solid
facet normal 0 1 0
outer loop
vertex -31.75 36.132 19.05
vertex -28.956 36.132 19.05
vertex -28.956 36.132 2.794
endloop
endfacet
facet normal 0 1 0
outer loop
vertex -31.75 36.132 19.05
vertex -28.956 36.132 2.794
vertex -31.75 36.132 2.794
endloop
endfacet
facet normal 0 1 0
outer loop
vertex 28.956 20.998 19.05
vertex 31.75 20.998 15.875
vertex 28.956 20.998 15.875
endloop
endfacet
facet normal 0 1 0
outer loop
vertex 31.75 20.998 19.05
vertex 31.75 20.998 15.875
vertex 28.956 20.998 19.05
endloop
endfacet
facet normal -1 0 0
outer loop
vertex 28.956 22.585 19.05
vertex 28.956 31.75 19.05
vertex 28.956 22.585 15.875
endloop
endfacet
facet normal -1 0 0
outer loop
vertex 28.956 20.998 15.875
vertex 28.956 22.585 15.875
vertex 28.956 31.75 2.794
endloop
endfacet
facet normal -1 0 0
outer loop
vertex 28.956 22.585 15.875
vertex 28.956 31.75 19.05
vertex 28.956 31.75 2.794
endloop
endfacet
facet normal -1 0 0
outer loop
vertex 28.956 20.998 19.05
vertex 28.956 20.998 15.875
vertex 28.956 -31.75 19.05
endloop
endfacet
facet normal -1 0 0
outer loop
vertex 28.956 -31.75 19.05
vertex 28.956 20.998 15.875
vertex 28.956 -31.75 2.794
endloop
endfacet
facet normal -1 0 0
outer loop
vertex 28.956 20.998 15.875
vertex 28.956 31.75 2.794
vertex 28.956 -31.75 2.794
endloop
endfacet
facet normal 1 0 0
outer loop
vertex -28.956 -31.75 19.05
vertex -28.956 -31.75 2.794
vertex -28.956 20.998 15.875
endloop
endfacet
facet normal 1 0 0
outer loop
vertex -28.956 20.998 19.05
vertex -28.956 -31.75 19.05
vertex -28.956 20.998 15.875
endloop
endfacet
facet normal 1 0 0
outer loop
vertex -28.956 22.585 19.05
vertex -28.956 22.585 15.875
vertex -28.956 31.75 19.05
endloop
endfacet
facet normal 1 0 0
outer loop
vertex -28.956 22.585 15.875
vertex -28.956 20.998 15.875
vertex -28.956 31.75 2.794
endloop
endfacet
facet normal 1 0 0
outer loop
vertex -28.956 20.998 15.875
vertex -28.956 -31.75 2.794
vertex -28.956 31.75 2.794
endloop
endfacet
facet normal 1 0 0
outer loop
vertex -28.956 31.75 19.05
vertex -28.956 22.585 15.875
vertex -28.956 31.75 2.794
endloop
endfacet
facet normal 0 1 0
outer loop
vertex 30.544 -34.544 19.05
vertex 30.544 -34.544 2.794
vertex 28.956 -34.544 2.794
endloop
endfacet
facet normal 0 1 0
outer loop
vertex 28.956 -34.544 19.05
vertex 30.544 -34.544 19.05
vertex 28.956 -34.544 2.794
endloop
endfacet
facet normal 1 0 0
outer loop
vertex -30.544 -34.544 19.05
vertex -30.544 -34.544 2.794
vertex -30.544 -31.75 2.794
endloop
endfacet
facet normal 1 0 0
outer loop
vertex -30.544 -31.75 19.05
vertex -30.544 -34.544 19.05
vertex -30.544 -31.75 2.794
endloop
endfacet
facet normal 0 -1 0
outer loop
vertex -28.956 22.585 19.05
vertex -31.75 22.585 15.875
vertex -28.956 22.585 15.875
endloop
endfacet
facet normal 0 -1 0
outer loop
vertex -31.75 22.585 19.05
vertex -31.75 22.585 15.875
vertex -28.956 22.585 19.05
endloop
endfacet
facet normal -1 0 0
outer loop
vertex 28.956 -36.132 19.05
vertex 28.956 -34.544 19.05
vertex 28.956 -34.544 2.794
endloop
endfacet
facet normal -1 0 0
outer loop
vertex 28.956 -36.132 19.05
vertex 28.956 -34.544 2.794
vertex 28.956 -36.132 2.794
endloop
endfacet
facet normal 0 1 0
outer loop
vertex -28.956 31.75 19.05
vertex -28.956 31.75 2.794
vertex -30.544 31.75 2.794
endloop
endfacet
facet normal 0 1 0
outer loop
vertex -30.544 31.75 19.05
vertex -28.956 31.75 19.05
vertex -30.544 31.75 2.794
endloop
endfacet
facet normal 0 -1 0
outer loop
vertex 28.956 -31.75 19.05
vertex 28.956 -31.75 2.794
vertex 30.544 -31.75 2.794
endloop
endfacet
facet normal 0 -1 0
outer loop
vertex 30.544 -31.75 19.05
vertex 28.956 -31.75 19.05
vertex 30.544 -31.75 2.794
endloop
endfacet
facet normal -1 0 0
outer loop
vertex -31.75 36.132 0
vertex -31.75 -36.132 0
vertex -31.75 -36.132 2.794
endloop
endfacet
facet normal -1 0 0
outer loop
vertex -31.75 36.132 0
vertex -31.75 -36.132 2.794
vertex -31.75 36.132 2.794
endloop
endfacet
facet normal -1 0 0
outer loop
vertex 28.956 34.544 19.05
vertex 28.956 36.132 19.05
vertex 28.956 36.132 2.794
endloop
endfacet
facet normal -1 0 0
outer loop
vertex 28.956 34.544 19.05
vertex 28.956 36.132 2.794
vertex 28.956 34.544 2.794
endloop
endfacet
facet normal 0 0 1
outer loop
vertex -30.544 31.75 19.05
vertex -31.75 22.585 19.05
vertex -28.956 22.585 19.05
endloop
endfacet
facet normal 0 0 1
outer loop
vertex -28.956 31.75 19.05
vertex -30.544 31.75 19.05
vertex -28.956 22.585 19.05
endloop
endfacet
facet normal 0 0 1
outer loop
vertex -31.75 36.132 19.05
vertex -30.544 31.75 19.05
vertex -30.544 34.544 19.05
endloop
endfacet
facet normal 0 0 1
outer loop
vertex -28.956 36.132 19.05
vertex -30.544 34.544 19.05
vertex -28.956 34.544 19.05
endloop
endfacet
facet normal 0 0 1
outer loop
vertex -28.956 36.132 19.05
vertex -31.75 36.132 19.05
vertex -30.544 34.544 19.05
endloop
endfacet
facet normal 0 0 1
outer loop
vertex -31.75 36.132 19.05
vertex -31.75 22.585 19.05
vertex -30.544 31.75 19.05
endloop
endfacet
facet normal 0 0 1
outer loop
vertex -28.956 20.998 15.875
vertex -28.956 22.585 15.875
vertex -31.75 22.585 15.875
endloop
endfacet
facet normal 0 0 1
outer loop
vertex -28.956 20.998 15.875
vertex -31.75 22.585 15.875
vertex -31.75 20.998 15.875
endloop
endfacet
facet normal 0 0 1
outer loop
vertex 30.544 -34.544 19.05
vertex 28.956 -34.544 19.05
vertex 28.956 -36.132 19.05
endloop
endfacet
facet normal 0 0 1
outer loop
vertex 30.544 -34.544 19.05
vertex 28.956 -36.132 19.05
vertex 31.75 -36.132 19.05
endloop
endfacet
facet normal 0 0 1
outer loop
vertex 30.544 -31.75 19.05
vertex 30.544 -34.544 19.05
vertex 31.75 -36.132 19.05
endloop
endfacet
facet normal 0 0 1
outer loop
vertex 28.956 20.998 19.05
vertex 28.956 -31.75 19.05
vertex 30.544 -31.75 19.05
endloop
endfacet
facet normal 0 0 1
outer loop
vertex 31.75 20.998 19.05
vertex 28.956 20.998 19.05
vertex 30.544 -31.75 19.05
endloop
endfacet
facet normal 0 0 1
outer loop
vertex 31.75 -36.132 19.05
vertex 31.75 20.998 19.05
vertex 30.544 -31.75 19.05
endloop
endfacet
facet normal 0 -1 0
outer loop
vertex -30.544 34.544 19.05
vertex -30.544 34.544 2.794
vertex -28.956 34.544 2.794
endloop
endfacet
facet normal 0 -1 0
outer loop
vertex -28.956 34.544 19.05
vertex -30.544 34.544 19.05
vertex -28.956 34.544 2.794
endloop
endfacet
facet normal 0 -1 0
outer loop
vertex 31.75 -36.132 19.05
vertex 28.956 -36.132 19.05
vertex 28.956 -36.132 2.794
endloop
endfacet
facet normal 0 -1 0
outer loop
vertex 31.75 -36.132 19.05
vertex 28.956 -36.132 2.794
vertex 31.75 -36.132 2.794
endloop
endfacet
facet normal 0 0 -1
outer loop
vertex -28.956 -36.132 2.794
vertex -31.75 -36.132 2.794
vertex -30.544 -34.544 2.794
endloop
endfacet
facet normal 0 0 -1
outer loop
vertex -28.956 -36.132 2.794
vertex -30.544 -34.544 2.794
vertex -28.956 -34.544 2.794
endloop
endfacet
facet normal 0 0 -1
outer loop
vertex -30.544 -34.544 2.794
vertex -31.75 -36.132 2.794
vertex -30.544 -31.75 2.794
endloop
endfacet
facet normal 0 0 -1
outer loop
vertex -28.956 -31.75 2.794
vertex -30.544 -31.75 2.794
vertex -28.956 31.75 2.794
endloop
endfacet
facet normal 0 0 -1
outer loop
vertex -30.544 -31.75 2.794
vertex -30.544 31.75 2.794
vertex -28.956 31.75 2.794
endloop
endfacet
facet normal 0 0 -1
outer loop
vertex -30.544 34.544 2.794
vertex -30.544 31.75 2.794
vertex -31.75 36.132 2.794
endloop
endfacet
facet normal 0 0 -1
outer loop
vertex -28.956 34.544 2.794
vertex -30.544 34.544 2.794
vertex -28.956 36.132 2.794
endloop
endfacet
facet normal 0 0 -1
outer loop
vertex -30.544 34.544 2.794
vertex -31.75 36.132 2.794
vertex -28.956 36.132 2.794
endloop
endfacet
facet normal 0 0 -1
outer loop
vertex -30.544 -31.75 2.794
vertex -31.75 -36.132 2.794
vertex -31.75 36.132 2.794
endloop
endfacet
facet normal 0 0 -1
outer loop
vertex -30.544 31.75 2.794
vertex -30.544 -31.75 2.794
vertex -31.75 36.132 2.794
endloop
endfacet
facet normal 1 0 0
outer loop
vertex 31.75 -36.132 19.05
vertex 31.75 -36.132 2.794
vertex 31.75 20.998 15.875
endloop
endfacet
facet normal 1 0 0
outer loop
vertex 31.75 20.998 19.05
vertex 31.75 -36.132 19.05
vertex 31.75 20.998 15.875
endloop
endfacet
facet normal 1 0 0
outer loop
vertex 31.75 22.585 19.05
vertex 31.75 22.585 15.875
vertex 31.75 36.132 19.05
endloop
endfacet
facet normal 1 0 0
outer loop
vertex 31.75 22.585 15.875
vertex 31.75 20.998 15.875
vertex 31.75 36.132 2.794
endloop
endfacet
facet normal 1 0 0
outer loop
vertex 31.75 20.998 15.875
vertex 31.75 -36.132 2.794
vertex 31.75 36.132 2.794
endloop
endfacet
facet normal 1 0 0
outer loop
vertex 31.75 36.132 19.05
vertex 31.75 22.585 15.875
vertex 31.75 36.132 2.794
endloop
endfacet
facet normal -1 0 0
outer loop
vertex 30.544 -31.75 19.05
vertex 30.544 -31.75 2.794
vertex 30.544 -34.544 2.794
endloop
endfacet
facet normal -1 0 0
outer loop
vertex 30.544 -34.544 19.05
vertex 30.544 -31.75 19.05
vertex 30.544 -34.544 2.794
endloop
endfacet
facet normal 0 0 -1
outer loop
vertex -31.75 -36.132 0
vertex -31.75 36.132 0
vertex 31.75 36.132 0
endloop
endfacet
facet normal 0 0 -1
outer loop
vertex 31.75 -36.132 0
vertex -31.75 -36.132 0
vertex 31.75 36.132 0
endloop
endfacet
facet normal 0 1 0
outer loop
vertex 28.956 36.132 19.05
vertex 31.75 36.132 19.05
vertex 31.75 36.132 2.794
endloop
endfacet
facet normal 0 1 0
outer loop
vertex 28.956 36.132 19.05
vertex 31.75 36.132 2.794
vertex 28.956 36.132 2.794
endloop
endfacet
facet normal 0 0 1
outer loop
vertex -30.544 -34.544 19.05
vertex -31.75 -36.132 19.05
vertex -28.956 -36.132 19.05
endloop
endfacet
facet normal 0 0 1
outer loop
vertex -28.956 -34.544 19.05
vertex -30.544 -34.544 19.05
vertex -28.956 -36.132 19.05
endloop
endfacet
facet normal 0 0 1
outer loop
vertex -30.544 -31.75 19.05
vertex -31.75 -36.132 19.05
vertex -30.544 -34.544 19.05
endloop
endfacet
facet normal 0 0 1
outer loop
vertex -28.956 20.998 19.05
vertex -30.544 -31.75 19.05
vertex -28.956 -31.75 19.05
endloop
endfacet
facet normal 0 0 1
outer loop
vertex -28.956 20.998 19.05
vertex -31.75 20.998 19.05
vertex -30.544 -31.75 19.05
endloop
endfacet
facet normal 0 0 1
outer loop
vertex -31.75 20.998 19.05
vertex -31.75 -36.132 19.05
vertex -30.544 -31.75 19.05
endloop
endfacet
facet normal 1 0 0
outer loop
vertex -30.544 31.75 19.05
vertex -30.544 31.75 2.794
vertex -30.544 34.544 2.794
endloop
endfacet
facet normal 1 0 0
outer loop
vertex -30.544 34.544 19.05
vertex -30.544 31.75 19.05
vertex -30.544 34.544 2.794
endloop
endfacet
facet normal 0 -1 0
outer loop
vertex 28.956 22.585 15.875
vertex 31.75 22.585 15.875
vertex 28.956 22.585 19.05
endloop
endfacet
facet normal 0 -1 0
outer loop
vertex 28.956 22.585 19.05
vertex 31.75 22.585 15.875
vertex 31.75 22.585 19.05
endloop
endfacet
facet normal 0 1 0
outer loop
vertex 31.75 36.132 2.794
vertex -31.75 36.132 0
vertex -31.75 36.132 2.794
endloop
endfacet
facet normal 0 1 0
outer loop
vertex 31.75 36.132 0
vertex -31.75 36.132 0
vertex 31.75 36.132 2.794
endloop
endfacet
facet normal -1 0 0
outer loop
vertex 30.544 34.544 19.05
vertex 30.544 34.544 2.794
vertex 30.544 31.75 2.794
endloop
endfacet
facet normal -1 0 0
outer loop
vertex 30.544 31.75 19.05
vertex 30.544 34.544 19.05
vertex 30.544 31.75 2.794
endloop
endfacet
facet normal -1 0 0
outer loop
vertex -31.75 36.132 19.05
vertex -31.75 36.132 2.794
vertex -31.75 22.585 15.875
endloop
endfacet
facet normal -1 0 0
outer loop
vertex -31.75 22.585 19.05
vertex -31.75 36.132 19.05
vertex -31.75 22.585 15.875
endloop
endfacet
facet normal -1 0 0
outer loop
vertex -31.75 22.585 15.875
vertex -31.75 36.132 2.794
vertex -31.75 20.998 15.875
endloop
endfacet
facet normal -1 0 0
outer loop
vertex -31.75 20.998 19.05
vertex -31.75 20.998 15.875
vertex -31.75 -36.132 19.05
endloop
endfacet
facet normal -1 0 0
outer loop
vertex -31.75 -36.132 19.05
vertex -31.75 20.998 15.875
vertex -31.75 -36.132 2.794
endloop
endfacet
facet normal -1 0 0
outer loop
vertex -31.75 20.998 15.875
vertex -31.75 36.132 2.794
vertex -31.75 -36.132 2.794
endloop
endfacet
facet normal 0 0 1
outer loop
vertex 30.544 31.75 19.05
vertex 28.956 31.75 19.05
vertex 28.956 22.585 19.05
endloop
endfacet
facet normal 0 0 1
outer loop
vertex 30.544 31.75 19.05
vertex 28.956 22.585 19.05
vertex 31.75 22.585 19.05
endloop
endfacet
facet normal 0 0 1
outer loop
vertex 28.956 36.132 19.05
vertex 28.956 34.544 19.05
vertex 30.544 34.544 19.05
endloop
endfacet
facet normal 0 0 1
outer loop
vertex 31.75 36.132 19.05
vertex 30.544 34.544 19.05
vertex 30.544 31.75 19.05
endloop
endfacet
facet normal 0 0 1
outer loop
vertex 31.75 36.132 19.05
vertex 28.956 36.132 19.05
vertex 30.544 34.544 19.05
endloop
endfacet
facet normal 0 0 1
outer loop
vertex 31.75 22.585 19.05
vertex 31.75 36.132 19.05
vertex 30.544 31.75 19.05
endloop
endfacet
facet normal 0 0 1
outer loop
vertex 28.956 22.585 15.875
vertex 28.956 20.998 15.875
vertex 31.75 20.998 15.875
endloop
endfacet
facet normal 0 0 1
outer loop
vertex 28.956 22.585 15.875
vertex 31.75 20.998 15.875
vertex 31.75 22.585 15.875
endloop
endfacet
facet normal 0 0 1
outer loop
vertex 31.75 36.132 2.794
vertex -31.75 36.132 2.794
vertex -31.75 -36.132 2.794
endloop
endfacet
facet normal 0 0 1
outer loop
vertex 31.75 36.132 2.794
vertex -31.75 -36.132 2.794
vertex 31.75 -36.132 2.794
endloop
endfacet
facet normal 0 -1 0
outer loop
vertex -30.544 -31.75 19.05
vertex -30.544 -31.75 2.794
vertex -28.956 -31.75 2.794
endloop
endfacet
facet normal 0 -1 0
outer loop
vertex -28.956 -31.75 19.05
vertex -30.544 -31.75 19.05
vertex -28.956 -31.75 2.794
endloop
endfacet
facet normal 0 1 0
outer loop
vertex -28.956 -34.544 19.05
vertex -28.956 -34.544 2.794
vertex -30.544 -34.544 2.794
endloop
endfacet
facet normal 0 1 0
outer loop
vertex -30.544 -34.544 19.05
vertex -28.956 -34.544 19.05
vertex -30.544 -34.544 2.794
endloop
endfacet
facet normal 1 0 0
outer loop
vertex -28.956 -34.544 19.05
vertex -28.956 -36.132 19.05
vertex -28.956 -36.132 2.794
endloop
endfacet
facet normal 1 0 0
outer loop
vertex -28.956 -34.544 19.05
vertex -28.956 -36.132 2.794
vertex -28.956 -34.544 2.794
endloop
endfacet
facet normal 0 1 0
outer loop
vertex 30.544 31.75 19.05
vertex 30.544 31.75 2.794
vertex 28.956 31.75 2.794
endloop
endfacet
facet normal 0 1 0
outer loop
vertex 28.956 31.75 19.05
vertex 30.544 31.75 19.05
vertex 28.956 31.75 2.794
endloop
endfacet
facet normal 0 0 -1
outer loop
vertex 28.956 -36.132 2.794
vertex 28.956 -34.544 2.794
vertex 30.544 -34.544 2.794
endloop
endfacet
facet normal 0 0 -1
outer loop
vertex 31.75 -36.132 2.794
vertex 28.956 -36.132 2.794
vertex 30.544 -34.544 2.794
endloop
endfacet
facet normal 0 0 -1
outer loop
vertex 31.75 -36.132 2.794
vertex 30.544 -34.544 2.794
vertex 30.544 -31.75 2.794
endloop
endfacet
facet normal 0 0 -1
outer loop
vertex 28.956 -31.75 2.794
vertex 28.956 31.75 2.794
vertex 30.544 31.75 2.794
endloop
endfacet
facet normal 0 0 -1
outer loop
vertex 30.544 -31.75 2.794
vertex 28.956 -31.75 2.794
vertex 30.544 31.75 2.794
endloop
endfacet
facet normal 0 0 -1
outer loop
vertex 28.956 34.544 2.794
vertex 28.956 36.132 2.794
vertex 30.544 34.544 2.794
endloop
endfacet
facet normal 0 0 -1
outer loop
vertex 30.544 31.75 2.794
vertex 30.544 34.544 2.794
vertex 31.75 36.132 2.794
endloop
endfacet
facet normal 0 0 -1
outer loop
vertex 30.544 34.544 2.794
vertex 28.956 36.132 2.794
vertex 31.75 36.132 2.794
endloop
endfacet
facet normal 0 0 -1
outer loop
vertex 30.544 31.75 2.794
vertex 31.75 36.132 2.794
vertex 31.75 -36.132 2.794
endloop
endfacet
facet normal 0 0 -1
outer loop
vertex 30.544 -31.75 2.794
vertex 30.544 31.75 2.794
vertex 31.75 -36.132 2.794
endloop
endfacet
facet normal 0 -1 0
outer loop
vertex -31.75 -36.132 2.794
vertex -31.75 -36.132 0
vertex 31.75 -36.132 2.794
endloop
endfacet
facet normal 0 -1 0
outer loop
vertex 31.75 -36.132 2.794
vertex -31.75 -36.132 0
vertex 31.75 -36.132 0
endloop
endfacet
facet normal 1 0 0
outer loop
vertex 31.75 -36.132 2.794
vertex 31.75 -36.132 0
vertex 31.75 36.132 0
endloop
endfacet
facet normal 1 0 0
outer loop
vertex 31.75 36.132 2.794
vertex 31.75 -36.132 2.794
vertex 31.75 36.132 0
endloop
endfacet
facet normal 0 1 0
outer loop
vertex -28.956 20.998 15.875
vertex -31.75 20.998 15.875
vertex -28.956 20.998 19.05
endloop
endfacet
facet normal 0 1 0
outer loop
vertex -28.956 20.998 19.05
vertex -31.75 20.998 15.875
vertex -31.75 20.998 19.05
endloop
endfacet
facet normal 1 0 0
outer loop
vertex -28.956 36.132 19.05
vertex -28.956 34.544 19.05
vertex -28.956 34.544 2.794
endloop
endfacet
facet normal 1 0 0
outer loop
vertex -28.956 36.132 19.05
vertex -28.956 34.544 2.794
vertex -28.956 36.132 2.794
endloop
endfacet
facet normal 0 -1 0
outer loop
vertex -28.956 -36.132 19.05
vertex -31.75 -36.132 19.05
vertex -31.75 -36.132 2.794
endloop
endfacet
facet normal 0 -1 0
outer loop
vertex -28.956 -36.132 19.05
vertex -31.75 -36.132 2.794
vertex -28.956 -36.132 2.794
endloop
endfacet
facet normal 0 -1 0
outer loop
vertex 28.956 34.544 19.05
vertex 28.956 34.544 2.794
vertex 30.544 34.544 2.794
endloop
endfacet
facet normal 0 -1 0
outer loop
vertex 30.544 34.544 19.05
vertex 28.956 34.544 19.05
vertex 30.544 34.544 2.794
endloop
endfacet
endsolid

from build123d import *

# Parameters (mm, degrees)
F0_W     = 63.5
F0_H     = 72.263
F1_DEPTH = 2.794
F3_DEPTH = 16.256
F5_DEPTH = 16.256
F6_W     = 1.5875
F6_H     = 3.175
F7_DEPTH = 2.794
F8_W     = 1.5875
F8_H     = 3.175
F9_DEPTH = 2.794


with BuildPart() as f1:
    # F0 (on Top) → F1 (new body)
    with BuildSketch(Plane.XY):
        Rectangle(F0_W, F0_H)
    extrude(amount=F1_DEPTH)


with BuildPart() as f3:
    # F2 (on face) → F3 (new body)
    with BuildSketch(Plane.XY.offset(2.794)):
        Polygon((28.956, 36.1315), (28.956, 34.544), (30.5435, 34.544), (30.5435, 31.75), (28.956, 31.75), (28.956, -31.75), (30.5435, -31.75), (30.5435, -34.544), (28.956, -34.544), (28.956, -36.1315), (31.75, -36.1315), (31.75, 36.1315), align=None)
    extrude(amount=F3_DEPTH)

    # F6 (on face) → F7 (cut, through all)
    with BuildSketch(Plane.YZ.offset(31.75)):
        with Locations((21.79132, 17.4625)):
            Rectangle(F6_W, F6_H)
    extrude(amount=-F7_DEPTH, mode=Mode.SUBTRACT)


with BuildPart() as f5:
    # F4 (on face) → F5 (new body)
    with BuildSketch(Plane.XY.offset(2.794)):
        Polygon((-31.75, -36.1315), (-28.956, -36.1315), (-28.956, -34.544), (-30.5435, -34.544), (-30.5435, -31.75), (-28.956, -31.75), (-28.956, 31.75), (-30.5435, 31.75), (-30.5435, 34.544), (-28.956, 34.544), (-28.956, 36.1315), (-31.75, 36.1315), align=None)
    extrude(amount=F5_DEPTH)

    # F8 (on face) → F9 (cut, through all)
    with BuildSketch(Plane(origin=(-31.75, 0, 0), x_dir=(0, -1, 0), z_dir=(-1, 0, 0))):
        with Locations((-21.79132, 17.4625)):
            Rectangle(F8_W, F8_H)
    extrude(amount=-F9_DEPTH, mode=Mode.SUBTRACT)


solid = Compound([f1.part, f3.part, f5.part])
